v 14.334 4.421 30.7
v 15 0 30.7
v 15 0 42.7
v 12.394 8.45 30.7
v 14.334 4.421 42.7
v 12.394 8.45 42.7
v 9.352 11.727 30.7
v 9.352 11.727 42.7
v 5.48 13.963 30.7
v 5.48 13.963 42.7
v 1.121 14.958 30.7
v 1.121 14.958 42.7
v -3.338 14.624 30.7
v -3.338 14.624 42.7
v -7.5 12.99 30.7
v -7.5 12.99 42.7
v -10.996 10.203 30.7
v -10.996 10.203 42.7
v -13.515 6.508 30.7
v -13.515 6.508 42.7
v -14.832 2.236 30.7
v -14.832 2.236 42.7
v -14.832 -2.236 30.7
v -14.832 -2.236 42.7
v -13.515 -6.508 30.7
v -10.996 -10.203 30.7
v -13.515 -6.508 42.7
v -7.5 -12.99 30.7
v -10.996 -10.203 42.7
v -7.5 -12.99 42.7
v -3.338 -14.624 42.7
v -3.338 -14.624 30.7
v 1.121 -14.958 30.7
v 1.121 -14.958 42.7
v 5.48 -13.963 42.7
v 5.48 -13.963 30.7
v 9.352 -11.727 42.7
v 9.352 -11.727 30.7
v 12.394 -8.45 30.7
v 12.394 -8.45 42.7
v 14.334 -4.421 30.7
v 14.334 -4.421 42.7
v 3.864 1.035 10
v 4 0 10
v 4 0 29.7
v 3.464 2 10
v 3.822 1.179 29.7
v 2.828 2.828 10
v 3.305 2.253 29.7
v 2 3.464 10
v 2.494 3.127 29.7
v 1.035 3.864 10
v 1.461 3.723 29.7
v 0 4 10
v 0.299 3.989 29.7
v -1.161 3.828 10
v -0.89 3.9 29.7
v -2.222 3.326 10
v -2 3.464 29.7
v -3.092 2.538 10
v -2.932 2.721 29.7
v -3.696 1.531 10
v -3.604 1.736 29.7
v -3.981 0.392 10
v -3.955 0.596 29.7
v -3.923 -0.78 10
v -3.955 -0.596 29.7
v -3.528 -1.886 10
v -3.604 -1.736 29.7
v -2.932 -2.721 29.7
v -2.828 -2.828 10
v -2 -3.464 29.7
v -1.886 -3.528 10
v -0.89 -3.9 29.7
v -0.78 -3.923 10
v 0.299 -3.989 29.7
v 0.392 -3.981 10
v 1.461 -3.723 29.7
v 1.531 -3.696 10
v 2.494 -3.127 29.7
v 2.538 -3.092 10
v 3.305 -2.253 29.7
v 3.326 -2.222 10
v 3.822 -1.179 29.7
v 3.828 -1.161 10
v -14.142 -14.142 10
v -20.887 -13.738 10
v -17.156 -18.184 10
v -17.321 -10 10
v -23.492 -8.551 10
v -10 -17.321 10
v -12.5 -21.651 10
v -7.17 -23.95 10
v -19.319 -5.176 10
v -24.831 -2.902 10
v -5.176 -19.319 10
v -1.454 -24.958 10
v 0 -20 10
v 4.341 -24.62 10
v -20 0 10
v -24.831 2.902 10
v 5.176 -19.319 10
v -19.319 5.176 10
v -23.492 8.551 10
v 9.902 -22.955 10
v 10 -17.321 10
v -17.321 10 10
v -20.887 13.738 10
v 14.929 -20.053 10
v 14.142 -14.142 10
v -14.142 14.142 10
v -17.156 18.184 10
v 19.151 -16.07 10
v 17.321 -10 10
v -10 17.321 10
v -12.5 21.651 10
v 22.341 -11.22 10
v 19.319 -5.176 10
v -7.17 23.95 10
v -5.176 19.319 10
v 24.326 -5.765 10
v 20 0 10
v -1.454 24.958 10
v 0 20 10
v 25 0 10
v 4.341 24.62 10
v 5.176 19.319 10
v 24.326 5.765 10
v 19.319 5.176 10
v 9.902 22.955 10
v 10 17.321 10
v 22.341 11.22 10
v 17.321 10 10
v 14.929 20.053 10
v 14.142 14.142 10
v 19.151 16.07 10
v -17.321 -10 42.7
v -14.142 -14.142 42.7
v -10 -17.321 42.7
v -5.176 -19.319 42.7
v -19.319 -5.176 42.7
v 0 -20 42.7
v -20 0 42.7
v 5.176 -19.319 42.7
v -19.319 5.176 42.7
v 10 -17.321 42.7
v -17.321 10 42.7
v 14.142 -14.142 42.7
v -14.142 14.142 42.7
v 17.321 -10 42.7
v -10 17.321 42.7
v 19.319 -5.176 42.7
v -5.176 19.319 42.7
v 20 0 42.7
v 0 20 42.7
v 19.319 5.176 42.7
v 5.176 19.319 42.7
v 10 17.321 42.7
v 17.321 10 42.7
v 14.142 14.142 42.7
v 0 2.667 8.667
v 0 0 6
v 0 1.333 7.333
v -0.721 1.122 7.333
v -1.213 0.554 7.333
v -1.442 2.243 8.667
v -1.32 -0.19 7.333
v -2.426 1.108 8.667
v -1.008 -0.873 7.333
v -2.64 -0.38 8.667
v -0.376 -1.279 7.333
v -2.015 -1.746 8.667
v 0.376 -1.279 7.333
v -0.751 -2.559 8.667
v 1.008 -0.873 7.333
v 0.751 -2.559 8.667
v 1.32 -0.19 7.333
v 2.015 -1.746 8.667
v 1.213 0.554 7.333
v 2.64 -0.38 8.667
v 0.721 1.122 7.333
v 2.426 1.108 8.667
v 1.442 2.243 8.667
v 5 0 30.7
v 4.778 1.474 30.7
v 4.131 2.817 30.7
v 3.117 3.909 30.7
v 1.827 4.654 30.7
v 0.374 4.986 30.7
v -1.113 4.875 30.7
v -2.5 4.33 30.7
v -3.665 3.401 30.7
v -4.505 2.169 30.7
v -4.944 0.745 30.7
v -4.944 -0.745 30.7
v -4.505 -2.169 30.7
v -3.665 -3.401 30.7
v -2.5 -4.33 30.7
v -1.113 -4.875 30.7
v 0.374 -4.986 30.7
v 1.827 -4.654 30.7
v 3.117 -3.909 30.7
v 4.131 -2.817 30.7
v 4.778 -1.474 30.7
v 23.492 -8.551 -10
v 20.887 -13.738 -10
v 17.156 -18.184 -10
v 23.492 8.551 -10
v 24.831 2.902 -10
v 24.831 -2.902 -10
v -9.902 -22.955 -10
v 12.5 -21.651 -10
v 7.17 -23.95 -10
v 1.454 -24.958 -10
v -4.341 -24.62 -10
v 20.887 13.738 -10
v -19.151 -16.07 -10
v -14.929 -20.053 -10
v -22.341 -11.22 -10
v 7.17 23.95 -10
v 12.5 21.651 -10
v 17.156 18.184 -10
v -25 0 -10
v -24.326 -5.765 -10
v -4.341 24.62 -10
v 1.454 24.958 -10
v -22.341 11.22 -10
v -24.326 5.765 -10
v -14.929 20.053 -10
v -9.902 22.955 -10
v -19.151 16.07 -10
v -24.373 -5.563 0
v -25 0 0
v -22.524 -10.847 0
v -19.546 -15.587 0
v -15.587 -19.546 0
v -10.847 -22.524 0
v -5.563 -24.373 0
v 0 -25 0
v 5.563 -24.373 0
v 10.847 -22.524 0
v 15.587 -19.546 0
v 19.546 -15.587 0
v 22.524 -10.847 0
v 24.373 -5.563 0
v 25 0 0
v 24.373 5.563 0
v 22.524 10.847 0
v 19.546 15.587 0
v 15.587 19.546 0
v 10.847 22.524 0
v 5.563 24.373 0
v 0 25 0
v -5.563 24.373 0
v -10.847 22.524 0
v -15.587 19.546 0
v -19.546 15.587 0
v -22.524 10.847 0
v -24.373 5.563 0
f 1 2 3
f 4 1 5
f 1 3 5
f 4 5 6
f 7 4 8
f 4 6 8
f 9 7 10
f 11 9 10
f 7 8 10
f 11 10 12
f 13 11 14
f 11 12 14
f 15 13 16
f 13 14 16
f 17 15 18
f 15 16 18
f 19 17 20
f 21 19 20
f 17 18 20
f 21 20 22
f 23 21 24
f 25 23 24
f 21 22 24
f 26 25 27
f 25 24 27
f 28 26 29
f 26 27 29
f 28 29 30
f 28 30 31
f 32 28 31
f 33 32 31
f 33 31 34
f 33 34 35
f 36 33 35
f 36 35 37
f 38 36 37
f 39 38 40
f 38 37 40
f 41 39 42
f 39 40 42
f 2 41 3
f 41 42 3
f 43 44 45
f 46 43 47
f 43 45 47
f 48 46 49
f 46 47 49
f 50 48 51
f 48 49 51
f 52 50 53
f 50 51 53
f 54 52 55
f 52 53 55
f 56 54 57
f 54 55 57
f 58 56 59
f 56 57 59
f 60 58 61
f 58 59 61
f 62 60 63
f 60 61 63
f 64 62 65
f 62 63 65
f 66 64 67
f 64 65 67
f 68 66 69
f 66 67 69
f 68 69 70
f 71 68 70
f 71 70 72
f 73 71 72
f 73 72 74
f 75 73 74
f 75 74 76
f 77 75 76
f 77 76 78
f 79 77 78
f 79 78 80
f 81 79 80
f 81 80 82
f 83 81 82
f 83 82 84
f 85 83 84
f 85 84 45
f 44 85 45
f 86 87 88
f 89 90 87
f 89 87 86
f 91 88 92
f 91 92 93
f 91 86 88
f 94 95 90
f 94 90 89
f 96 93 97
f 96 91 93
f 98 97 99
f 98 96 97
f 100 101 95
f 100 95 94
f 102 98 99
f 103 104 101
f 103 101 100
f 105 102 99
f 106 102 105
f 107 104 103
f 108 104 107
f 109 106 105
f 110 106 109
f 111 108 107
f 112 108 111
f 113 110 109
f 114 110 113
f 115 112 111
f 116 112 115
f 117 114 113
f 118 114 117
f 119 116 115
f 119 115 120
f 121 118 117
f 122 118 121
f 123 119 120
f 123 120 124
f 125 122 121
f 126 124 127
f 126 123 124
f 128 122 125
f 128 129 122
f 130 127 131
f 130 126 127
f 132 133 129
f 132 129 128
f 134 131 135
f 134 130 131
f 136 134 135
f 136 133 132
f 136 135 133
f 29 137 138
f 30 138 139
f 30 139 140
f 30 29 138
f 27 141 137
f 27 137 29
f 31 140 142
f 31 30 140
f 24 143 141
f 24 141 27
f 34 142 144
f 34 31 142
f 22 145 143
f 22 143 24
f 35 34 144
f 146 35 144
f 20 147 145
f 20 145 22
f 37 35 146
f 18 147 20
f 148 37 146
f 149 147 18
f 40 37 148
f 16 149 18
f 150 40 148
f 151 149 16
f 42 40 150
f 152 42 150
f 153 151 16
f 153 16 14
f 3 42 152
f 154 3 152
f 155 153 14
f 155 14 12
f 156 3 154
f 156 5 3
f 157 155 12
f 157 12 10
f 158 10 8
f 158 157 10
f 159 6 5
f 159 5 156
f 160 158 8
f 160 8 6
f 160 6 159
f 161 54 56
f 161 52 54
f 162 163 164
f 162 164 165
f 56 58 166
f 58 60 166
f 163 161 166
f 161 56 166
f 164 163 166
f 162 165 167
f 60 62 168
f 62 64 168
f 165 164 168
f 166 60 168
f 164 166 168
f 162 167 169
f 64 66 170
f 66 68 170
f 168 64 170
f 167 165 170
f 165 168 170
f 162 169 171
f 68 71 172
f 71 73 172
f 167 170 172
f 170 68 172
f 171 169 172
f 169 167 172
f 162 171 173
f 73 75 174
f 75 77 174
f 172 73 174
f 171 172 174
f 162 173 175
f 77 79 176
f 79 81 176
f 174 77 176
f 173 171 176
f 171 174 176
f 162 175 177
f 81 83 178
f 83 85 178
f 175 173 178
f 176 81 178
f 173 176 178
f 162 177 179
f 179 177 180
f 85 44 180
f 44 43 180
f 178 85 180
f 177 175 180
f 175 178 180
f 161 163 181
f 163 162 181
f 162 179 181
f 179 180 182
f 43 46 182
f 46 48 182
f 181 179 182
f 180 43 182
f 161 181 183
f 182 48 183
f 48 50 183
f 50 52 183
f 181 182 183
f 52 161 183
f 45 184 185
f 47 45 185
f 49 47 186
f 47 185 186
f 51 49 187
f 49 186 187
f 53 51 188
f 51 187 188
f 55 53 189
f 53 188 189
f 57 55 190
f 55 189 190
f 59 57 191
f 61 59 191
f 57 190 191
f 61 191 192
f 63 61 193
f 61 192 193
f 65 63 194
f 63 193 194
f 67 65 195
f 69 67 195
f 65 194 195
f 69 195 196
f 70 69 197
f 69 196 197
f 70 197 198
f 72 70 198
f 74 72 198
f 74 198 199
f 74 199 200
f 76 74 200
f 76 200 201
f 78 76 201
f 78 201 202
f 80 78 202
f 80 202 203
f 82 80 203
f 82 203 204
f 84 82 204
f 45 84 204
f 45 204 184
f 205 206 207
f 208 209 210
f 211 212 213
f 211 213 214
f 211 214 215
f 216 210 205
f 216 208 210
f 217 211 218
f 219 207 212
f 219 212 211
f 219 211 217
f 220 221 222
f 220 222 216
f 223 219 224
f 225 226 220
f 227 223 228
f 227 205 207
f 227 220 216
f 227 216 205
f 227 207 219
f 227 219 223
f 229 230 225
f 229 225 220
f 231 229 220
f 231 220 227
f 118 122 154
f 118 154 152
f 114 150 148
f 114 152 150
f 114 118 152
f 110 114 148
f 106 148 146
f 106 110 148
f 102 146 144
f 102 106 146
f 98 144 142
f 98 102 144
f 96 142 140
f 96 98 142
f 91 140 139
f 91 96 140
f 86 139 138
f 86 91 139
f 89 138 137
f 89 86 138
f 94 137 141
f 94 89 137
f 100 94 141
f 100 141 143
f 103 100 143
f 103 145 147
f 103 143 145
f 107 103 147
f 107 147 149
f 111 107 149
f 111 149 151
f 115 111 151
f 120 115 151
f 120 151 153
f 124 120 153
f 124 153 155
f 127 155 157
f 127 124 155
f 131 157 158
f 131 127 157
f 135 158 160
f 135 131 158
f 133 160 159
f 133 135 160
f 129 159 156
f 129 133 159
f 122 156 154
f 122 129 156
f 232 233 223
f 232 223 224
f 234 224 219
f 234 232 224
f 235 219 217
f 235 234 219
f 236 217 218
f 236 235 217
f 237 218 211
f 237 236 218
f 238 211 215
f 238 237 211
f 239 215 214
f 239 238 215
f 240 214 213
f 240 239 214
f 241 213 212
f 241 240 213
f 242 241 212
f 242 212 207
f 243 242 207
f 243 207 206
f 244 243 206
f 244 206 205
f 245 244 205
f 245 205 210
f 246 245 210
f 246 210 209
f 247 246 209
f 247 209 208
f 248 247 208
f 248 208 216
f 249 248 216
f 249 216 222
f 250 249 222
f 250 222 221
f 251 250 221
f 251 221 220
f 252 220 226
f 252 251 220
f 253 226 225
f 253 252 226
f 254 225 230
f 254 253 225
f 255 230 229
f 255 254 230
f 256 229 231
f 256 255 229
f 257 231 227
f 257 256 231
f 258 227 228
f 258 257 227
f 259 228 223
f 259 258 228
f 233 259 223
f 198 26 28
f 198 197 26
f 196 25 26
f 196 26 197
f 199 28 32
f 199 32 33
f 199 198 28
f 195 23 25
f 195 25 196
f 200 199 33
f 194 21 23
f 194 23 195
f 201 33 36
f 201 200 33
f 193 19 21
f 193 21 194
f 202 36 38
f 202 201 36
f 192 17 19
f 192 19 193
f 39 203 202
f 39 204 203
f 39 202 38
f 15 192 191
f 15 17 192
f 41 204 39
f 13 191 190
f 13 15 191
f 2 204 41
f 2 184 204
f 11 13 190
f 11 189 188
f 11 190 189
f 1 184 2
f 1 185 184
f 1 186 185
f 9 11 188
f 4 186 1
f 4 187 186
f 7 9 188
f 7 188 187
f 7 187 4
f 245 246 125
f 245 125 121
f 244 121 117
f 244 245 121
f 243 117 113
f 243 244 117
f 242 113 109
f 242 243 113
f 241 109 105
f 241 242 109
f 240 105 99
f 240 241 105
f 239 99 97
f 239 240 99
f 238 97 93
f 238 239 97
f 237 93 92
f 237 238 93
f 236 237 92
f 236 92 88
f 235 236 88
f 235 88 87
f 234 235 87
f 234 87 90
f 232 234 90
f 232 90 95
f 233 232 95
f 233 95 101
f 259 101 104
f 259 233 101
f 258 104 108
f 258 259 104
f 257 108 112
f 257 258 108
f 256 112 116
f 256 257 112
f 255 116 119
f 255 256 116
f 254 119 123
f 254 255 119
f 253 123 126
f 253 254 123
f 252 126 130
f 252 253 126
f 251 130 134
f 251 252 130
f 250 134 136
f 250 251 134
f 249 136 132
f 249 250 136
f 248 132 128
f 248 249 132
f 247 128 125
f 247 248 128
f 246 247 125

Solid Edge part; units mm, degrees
sketch "Sketch1" plane through (0, 0, 0) normal (0, 0, 1) x (1, 0, 0)
  circle A0 centre (0, 0) radius 25
extrude "Protrusion1" add sketch "Sketch1" along normal blind 10
sketch "Sketch2" plane through (0, 0, 0) normal (1, 0, 0) x (0, 1, 0)
  line L0 (0, 10) -> (4, 10)
  line L1 (4, 10) -> (0, 6)
  line L2 (0, 10) -> (0, 6)
revolve "RevolvedCutout1" cut sketch "Sketch2" angle 360 about axis through (0, 0, 0) along (0, 0, 1)
sketch "Sketch3" plane through (0, 0, 10) normal (0, 0, 1) x (1, 0, 0)
  circle A0 centre (0, 0) radius 20
extrude "Protrusion2" add sketch "Sketch3" along normal blind 32.7
sketch "Sketch4" plane through (0, 0, 42.7) normal (0, 0, 1) x (1, 0, 0)
  circle A0 centre (0, 0) radius 15
extrude "ExtrudedCutout_2" cut sketch "Sketch4" against normal blind 12
sketch "Sketch5" plane through (0, 0, 30.7) normal (0, 0, 1) x (1, 0, 0)
  circle A0 centre (0, 0) radius 4
extrude "ExtrudedCutout_3" cut sketch "Sketch5" against normal blind 20.7
cosmetic_thread "Thread1" size "Tr 8 x 2"
sketch "Sketch6" plane through (0, 0, 0) normal (0, 1, 0) x (-1, 0, 0)
  line L0 (-5, 30.7) -> (-4, 29.7)
  line L1 (-4, 29.7) -> (-4, 30.7)
  line L2 (-4, 30.7) -> (-5, 30.7)
revolve "RevolvedCutout2" cut sketch "Sketch6" angle 360 about axis through (0, 0, 0) along (0, 0, 1)
sketch "Sketch7" plane through (0, 0, 0) normal (0, 0, -1) x (-1, 0, 0)
  circle A0 centre (0, 0) radius 25
extrude "ExtrudedProtrusion_4" add sketch "Sketch7" along normal blind 10
properties material "Steel - Stainless:1.4301 , X5CrNi18-10"
